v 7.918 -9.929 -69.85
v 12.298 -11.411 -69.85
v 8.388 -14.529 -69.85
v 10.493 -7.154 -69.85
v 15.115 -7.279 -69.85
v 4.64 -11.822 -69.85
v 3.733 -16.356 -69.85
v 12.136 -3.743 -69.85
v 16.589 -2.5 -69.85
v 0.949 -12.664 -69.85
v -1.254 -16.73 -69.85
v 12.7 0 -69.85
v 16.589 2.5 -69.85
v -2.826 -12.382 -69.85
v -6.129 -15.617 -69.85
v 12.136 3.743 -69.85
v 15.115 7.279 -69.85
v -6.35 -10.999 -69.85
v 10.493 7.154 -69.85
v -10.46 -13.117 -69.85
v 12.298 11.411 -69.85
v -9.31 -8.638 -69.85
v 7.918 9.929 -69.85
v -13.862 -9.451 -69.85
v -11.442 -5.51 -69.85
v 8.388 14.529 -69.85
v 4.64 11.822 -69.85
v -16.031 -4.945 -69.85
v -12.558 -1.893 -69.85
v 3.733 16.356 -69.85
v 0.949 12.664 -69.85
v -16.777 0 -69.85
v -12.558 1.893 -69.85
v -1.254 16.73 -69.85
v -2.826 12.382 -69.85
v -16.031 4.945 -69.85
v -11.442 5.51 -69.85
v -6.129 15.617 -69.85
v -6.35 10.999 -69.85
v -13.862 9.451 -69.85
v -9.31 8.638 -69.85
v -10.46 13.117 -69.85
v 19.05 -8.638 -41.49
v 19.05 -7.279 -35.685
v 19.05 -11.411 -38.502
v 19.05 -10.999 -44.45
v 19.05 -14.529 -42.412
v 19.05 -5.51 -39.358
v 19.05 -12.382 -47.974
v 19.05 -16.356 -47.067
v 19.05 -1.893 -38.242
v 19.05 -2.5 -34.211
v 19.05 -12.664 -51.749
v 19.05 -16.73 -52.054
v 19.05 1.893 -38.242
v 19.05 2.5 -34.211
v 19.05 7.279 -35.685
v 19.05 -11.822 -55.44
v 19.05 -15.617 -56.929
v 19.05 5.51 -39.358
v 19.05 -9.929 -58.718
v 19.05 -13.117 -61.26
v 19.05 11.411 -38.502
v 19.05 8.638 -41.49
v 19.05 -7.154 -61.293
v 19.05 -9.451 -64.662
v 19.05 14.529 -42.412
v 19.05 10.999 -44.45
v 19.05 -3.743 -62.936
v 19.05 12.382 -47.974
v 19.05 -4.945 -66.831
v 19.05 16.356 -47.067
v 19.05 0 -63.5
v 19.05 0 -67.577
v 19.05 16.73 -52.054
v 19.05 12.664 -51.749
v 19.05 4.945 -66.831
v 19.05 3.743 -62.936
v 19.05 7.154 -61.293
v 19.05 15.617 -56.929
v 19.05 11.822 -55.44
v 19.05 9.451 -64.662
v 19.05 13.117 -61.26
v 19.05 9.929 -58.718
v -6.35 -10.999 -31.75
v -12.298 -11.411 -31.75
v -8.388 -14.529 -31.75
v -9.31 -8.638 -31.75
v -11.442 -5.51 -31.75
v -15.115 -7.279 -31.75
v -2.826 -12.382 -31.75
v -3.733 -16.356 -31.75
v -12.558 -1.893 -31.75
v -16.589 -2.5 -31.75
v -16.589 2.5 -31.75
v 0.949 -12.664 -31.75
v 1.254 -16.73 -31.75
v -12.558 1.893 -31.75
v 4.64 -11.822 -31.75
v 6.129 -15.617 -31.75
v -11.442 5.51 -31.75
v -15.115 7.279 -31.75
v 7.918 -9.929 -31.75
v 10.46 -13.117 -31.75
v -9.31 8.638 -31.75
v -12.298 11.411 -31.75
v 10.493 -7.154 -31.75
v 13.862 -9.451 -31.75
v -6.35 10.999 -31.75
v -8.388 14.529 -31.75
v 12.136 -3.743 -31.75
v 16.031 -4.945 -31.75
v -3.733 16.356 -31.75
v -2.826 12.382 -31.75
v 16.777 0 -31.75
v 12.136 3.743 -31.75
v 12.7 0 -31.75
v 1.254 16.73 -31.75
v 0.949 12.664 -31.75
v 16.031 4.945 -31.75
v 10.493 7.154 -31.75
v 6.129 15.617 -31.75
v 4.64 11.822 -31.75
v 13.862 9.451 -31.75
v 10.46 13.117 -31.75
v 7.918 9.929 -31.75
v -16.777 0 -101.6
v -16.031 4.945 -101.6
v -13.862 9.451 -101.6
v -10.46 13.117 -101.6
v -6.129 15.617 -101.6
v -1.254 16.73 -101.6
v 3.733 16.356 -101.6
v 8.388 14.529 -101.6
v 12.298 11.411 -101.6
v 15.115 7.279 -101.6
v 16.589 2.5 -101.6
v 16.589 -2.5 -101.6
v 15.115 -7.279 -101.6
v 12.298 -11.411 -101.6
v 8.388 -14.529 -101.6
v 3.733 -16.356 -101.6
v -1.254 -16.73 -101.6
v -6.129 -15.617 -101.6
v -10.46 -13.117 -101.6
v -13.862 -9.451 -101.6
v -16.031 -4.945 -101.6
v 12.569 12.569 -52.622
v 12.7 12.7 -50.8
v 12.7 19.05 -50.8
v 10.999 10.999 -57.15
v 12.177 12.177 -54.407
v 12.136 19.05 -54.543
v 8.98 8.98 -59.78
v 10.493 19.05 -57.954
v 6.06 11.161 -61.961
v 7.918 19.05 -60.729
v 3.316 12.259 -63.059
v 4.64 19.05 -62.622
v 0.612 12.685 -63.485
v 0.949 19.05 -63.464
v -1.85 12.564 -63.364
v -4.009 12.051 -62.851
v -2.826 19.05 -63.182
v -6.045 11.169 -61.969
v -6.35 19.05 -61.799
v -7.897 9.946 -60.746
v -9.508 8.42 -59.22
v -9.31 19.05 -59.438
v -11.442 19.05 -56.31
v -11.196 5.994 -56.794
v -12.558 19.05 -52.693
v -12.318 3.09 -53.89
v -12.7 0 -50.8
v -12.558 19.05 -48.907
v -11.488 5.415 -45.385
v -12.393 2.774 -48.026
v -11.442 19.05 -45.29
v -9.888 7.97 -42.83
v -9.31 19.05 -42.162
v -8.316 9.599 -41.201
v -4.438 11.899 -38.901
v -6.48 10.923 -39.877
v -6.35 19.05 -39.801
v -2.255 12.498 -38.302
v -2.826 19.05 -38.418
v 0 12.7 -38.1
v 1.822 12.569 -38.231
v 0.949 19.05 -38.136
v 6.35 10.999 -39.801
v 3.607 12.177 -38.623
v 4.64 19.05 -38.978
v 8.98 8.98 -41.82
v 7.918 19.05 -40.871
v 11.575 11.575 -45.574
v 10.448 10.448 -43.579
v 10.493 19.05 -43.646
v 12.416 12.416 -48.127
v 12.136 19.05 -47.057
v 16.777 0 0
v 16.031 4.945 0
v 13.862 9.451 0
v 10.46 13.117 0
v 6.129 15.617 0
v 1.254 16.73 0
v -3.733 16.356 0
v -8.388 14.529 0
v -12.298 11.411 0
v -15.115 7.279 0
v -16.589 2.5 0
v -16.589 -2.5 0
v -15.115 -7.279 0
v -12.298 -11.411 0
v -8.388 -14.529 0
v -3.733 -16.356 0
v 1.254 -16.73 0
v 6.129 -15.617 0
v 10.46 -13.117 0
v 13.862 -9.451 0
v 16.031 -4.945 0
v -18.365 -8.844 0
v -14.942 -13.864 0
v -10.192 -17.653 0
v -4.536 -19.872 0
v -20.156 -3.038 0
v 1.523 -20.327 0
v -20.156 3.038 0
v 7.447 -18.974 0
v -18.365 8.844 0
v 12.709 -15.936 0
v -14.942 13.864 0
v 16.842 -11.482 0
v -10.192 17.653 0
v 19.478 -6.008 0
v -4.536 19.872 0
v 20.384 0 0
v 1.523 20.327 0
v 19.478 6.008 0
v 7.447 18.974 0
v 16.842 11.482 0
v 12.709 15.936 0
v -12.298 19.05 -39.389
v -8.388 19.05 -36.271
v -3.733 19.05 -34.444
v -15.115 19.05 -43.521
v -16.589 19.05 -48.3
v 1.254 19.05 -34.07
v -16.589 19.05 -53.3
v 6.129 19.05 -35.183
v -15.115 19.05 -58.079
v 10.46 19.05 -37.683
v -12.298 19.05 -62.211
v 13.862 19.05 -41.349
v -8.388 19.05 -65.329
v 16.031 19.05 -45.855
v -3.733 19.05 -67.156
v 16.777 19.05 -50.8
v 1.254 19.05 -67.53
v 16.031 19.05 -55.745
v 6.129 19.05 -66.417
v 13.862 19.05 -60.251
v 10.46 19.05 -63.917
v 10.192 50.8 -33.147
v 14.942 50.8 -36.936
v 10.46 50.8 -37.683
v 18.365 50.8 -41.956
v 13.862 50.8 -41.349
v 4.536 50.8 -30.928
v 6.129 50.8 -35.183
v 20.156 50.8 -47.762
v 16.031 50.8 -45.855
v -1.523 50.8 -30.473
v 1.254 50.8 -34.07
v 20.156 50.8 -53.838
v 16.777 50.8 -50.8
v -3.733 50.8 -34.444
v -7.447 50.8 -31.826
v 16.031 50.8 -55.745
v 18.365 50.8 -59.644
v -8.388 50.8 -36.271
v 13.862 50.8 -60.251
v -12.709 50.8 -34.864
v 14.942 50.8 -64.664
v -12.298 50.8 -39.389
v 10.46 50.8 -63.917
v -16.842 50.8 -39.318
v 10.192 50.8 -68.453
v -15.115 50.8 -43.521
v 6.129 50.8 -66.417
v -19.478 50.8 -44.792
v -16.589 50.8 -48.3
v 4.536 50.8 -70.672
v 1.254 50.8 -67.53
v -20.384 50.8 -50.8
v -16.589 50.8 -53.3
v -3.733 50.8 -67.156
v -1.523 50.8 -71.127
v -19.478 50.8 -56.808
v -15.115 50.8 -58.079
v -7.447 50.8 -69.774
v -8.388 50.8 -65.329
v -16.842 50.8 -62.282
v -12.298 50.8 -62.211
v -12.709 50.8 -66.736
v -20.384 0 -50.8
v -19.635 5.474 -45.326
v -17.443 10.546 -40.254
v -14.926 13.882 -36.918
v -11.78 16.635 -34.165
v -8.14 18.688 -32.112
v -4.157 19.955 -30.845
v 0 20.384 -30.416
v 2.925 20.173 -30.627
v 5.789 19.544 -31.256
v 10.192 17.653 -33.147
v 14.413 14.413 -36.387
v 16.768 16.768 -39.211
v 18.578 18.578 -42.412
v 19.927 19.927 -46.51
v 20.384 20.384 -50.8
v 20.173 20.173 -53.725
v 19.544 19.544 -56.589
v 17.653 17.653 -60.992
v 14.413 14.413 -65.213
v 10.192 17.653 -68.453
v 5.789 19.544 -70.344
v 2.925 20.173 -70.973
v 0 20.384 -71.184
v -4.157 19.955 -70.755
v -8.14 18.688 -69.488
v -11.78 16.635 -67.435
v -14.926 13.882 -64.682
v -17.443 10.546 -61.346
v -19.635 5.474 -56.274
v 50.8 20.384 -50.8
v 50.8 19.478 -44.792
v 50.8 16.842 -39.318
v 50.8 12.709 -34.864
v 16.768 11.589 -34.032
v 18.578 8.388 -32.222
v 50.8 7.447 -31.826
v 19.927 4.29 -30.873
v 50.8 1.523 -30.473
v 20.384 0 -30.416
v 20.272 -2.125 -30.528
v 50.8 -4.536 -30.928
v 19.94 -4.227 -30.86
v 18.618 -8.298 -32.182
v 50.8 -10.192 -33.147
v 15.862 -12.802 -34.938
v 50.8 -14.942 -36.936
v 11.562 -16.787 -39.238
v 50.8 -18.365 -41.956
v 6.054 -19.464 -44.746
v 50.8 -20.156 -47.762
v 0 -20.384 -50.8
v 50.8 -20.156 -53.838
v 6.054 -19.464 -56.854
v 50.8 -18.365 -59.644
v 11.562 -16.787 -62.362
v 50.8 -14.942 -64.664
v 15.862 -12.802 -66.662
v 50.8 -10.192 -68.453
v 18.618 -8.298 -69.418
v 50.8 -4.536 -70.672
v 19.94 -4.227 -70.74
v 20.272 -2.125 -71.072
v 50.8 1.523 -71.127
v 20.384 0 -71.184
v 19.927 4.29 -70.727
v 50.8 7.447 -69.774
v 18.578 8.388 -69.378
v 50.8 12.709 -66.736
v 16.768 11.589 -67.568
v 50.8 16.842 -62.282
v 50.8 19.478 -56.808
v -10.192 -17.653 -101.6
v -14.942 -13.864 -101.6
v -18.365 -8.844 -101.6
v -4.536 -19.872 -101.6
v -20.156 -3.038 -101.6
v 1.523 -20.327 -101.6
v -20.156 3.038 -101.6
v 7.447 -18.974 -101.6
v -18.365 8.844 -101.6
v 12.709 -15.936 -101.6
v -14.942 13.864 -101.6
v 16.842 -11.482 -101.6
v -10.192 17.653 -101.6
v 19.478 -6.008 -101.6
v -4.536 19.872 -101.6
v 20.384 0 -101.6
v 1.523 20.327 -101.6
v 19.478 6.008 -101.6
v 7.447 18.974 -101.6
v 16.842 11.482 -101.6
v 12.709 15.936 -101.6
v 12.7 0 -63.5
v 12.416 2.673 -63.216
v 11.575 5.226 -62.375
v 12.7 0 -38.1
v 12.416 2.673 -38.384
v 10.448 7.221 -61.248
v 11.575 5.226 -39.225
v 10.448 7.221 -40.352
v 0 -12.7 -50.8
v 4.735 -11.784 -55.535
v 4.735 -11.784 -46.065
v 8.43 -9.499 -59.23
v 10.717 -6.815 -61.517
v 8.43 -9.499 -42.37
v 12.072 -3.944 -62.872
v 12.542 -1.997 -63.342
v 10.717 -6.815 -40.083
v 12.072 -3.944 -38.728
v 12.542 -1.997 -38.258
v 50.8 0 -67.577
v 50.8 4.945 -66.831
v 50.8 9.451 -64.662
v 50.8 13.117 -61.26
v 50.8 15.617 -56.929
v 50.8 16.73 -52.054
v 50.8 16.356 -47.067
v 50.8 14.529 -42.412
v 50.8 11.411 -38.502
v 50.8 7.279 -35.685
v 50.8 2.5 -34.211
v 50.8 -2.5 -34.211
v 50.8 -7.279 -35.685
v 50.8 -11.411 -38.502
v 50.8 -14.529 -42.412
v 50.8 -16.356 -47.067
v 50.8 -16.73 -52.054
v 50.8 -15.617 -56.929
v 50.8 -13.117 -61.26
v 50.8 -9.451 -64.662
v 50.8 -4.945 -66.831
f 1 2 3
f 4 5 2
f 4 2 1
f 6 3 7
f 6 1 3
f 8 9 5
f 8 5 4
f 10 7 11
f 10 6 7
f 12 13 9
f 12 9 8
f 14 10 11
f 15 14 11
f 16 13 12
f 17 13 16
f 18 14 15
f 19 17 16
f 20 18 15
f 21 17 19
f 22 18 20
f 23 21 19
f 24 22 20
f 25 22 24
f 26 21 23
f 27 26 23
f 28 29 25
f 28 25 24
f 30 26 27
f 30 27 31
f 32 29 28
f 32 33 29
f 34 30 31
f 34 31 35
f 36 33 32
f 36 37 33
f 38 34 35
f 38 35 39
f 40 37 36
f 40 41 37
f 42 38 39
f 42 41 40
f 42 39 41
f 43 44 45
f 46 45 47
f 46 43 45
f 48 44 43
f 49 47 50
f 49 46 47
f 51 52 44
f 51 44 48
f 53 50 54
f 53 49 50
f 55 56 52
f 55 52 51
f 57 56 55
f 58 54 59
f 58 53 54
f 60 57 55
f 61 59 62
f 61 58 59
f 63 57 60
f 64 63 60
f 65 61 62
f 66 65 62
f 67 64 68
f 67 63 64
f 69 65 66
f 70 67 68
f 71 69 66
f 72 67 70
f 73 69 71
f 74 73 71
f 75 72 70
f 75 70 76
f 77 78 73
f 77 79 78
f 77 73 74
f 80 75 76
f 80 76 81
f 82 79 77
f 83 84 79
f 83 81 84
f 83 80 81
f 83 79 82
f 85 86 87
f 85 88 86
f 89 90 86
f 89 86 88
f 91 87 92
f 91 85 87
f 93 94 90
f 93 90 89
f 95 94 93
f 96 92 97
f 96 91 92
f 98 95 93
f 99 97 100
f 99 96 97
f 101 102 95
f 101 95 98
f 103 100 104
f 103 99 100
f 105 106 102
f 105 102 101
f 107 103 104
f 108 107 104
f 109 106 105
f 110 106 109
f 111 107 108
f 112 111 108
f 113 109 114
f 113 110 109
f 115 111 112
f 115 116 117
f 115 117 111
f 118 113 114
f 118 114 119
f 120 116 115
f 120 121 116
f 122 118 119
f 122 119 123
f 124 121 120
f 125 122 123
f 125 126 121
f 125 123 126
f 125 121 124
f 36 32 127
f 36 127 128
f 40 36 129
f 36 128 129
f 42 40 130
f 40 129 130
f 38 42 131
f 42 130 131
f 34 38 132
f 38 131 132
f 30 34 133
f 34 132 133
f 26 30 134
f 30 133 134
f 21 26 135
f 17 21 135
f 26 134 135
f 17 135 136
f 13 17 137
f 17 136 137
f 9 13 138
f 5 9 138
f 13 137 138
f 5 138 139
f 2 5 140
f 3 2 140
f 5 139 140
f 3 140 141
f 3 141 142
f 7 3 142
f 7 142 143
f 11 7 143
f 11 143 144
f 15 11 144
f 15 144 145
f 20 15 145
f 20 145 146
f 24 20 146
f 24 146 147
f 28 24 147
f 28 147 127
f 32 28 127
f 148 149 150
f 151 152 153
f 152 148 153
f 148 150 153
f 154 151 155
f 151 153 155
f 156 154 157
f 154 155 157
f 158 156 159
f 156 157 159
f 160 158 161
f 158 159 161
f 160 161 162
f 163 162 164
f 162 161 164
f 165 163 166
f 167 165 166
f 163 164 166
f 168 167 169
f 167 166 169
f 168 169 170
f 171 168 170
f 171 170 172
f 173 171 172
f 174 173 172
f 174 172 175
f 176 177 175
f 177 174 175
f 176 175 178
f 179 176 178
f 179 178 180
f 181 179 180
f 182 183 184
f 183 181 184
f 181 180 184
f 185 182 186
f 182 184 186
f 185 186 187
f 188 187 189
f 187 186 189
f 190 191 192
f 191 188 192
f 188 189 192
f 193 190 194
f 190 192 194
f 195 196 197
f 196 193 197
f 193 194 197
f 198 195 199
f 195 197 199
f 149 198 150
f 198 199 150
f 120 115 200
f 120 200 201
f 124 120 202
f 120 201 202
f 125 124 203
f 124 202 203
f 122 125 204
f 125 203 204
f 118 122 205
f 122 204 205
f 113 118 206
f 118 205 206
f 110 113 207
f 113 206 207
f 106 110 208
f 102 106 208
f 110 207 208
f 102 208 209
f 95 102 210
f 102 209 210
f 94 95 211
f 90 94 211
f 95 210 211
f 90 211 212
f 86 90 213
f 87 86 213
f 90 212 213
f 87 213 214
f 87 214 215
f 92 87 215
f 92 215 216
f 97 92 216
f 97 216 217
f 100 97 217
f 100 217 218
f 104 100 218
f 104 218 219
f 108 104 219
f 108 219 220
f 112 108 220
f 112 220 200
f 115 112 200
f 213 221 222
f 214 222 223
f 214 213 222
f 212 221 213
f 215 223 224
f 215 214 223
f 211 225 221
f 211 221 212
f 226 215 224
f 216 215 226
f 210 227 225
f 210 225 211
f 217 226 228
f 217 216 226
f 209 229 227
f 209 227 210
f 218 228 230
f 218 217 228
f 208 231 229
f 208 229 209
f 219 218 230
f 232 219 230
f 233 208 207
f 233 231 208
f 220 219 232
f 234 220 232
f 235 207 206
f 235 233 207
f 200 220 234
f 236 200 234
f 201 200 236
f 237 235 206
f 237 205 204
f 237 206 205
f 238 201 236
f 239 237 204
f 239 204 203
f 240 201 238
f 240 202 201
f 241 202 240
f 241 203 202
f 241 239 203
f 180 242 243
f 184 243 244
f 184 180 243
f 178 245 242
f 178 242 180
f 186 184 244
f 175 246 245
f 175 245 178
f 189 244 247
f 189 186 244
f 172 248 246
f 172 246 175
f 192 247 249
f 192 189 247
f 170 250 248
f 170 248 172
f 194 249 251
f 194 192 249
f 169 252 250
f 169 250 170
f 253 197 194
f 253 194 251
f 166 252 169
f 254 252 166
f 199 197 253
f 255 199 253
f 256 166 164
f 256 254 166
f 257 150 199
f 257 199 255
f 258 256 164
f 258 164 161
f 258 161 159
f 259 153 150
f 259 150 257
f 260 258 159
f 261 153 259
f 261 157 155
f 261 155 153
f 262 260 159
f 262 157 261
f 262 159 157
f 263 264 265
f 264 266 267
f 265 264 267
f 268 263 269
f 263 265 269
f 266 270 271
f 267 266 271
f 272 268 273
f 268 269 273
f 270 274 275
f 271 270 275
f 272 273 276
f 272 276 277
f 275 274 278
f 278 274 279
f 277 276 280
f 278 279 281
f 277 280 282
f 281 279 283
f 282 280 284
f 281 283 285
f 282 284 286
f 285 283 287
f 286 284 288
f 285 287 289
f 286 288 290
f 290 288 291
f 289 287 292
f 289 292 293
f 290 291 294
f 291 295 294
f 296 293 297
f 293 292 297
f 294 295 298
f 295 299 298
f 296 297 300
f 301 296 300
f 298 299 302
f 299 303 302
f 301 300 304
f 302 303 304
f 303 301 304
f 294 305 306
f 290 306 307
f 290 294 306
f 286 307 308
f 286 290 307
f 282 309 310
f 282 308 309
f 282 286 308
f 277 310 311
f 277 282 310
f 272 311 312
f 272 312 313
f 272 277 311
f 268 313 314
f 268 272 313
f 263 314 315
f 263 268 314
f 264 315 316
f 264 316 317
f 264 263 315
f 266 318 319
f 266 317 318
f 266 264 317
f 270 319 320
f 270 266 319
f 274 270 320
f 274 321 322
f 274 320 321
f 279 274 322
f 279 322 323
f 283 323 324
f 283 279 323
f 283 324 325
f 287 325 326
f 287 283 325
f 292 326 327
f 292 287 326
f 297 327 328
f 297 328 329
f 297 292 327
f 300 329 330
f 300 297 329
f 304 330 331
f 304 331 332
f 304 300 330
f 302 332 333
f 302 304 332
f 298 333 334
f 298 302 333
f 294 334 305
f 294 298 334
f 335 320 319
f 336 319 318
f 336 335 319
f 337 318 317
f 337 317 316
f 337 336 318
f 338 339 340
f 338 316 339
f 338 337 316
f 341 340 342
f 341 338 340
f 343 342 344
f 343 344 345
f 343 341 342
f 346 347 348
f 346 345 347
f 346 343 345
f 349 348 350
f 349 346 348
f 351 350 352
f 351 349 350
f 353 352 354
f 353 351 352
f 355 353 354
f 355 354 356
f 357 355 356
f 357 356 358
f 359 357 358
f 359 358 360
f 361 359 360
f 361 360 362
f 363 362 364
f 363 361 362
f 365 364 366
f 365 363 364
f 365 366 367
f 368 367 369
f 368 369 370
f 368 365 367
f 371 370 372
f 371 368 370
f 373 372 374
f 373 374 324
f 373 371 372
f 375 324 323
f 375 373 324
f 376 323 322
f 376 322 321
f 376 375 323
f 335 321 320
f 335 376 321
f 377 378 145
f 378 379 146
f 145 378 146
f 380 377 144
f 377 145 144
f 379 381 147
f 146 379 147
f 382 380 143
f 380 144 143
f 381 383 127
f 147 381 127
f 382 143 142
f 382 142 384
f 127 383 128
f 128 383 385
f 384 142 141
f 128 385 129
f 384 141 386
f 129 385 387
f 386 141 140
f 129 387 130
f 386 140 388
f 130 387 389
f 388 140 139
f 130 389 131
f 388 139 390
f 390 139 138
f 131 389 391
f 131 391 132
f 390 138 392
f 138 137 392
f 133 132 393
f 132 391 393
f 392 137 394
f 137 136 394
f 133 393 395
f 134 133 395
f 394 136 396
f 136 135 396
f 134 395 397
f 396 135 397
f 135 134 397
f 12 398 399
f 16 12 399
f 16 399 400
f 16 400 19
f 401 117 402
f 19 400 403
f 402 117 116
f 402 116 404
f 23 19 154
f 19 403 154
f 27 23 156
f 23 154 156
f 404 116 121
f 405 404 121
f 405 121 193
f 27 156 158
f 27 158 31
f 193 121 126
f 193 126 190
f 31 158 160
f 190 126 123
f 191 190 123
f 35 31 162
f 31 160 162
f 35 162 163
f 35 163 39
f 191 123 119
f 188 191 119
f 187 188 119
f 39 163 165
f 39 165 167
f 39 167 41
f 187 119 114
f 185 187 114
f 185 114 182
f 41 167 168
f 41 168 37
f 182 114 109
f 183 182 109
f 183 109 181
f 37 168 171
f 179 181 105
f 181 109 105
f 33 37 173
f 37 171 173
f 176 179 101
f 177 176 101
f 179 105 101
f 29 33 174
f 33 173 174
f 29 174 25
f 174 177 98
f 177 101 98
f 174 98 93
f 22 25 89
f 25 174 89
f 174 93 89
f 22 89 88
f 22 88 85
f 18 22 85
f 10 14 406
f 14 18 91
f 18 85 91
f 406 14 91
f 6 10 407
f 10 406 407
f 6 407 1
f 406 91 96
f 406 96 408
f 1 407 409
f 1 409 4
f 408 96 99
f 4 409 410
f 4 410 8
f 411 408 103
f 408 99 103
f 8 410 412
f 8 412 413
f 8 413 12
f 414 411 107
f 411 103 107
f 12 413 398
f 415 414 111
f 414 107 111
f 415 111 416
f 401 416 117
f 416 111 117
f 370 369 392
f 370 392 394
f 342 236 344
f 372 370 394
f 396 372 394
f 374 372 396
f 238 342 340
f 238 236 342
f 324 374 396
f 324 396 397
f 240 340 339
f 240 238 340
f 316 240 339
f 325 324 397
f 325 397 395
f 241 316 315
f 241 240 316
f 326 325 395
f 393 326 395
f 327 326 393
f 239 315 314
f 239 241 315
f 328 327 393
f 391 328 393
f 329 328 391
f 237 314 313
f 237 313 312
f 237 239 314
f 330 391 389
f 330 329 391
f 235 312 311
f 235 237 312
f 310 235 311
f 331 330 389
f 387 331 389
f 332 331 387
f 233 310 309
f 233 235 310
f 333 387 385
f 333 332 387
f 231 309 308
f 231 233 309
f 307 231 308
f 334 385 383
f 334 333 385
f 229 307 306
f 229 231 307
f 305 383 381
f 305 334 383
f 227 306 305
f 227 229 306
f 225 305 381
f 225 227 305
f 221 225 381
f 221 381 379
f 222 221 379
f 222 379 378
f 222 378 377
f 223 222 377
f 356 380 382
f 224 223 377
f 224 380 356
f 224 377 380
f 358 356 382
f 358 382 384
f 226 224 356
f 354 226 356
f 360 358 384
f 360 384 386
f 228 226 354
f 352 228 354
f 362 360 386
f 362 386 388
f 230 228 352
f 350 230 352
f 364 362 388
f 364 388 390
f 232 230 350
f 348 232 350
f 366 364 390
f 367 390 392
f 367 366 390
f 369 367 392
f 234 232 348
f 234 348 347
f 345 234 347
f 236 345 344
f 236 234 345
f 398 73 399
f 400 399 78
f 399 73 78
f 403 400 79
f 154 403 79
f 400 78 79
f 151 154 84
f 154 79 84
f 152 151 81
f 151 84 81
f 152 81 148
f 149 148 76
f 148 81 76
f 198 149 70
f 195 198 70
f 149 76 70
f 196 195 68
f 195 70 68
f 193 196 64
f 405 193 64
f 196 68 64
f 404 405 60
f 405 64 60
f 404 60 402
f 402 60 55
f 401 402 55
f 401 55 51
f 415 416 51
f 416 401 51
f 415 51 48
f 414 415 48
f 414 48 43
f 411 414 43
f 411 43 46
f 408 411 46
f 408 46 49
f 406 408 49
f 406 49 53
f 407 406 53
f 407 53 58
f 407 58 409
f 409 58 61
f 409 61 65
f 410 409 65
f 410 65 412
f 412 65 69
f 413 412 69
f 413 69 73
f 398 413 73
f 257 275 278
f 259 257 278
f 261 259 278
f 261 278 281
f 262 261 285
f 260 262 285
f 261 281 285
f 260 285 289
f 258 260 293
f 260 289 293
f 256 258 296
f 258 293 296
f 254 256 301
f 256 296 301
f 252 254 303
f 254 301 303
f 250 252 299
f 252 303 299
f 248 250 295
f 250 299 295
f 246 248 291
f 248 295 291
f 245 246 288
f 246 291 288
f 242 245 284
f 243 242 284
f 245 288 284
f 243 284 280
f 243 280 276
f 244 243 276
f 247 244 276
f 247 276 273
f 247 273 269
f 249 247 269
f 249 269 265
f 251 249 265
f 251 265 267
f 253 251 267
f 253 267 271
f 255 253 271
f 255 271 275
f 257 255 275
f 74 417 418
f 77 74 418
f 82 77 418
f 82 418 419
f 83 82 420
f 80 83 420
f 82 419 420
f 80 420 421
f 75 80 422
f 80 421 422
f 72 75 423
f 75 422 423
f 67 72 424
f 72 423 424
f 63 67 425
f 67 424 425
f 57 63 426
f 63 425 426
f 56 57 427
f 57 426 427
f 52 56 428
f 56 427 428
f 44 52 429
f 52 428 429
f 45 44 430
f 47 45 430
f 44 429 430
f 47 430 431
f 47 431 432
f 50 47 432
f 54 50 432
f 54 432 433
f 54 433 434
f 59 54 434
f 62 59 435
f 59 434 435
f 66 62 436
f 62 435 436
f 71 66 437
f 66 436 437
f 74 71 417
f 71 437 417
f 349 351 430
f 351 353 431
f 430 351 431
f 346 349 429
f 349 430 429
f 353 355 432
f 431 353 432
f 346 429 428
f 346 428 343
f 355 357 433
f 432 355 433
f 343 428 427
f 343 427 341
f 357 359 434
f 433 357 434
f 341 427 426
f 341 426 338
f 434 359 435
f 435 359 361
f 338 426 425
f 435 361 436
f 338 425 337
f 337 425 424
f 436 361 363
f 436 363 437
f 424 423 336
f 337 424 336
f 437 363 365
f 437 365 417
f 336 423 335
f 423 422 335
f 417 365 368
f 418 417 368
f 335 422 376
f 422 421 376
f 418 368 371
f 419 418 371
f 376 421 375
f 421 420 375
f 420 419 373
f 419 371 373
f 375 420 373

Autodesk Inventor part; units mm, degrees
ref_plane "YZ Plane" through (0, 0, 0) normal (1, 0, 0) x (0, 1, 0)
sketch "Sketch1" plane through (0, 0, 0) normal (0, 0, 1) x (1, 0, 0)
  circle A0 centre (0, 0) radius 20.3835
  dimension "d0" = 40.767
extrude "Extrusion1" add sketch "Sketch1" against normal blind 101.6
sketch "Sketch11" plane through (0, 0, -101.6) normal (0, 0, -1) x (-1, 0, 0)
  circle A0 centre (0, 0) radius 20.3835 projected
  line L0 (0, 20.3835) -> (-10.8843, 20.3835)
sketch "Sketch10" plane through (0, 0, 0) normal (0, 0, 1) x (1, 0, 0)
  circle A0 centre (0, 0) radius 20.3835 projected
  line L0 (0, 20.3835) -> (-22.4405, 20.3835)
sketch "Sketch2" plane through (0, 0, 0) normal (0, 0, 1) x (1, 0, 0)
  circle A0 centre (0, 0) radius 20.3835 projected
  line L0 (20.3835, 0) -> (20.3835, 20.3835)
sketch "Sketch3" plane through (0, 0, -101.6) normal (0, 0, -1) x (-1, 0, 0)
  circle A0 centre (0, 0) radius 20.3835 projected
  line L0 (-20.3835, 0) -> (-20.3835, 20.3835)
ref_plane "Work Plane1" through (20.3835, 0, 0) normal (-1, 0, 0) x (0, 1, 0)
ref_plane "Work Plane2" through (0, 20.3835, 0) normal (0, -1, 0) x (-1, 0, 0)
sketch "Sketch4" plane through (20.3835, 0, 0) normal (-1, 0, 0) x (0, 1, 0)
  line L0 (20.3835, 101.6) -> (-20.3835, 101.6) projected
  circle A0 centre (0, 50.8) radius 20.3835
  line L1 (-20.3835, 0) -> (-20.3835, 101.6) projected
  point P0 (0, 0)
extrude "Extrusion2" add sketch "Sketch4" against normal blind 30.4165
extrude "Extrusion3" add sketch "Sketch4" along normal blind 20.3835
sketch "Sketch12" plane through (0, 20.3835, 0) normal (0, -1, 0) x (-1, 0, 0)
  line L0 (-20.3835, 30.4165) -> (0, 50.8) projected
  circle A0 centre (0, 50.8) radius 20.3835
  point P0 (0, 0)
extrude "Extrusion9" add sketch "Sketch12" against normal blind 30.4165
extrude "Extrusion10" add sketch "Sketch12" along normal blind 20.3835
sketch "Sketch5" plane through (0, 0, 0) normal (0, 0, 1) x (1, 0, 0)
  circle A0 centre (0, 0) radius 16.7767
  dimension "d7" = 33.5534
sketch "Sketch6" plane through (0, 0, 0) normal (0, 0, 1) x (1, 0, 0)
  circle A0 centre (0, 0) radius 12.7
  dimension "d8" = 25.4
sketch "Sketch7" plane through (50.8, 0, -50.8) normal (1, 0, 0) x (0, 0, -1)
  circle A0 centre (0, 0) radius 16.7767
  point P0 (-50.8, 0)
  dimension "d9" = 33.5534
sketch "Sketch8" plane through (50.8, 0, -50.8) normal (1, 0, 0) x (0, 0, -1)
  circle A0 centre (0, 0) radius 12.7
  point P0 (-50.8, 0)
  dimension "d10" = 25.4
sketch "Sketch9" plane through (0, 0, -101.6) normal (0, 0, -1) x (-1, 0, 0)
  circle A0 centre (0, 0) radius 16.7767
  dimension "d11" = 33.5534
extrude "Extrusion4" cut sketch "Sketch9" against normal blind 31.75
extrude "Extrusion5" cut sketch "Sketch7" against normal blind 31.75
extrude "Extrusion6" cut sketch "Sketch5" against normal blind 31.75
extrude "Extrusion7" cut sketch "Sketch6" against normal blind 101.6
extrude "Extrusion8" cut sketch "Sketch8" against normal blind 50.8
sketch "Sketch13" plane through (0, 50.8, -50.8) normal (0, 1, 0) x (1, 0, 0)
  circle A0 centre (0, 0) radius 16.7767
  point P0 (0, -50.8)
  dimension "d26" = 33.5534
extrude "Extrusion11" cut sketch "Sketch13" against normal blind 31.75
sketch "Sketch14" plane through (0, 50.8, -50.8) normal (0, 1, 0) x (1, 0, 0)
  line L0 (0, 0) -> (20.3835, -20.3835) projected
  circle A0 centre (0, 0) radius 12.7
  point P0 (0, -50.8)
  point P1 (14.4133, -14.4133)
  dimension "d29" = 25.4
extrude "Extrusion12" cut sketch "Sketch14" against normal blind 50.8
properties part number "4-way Tee 1 Inch"
